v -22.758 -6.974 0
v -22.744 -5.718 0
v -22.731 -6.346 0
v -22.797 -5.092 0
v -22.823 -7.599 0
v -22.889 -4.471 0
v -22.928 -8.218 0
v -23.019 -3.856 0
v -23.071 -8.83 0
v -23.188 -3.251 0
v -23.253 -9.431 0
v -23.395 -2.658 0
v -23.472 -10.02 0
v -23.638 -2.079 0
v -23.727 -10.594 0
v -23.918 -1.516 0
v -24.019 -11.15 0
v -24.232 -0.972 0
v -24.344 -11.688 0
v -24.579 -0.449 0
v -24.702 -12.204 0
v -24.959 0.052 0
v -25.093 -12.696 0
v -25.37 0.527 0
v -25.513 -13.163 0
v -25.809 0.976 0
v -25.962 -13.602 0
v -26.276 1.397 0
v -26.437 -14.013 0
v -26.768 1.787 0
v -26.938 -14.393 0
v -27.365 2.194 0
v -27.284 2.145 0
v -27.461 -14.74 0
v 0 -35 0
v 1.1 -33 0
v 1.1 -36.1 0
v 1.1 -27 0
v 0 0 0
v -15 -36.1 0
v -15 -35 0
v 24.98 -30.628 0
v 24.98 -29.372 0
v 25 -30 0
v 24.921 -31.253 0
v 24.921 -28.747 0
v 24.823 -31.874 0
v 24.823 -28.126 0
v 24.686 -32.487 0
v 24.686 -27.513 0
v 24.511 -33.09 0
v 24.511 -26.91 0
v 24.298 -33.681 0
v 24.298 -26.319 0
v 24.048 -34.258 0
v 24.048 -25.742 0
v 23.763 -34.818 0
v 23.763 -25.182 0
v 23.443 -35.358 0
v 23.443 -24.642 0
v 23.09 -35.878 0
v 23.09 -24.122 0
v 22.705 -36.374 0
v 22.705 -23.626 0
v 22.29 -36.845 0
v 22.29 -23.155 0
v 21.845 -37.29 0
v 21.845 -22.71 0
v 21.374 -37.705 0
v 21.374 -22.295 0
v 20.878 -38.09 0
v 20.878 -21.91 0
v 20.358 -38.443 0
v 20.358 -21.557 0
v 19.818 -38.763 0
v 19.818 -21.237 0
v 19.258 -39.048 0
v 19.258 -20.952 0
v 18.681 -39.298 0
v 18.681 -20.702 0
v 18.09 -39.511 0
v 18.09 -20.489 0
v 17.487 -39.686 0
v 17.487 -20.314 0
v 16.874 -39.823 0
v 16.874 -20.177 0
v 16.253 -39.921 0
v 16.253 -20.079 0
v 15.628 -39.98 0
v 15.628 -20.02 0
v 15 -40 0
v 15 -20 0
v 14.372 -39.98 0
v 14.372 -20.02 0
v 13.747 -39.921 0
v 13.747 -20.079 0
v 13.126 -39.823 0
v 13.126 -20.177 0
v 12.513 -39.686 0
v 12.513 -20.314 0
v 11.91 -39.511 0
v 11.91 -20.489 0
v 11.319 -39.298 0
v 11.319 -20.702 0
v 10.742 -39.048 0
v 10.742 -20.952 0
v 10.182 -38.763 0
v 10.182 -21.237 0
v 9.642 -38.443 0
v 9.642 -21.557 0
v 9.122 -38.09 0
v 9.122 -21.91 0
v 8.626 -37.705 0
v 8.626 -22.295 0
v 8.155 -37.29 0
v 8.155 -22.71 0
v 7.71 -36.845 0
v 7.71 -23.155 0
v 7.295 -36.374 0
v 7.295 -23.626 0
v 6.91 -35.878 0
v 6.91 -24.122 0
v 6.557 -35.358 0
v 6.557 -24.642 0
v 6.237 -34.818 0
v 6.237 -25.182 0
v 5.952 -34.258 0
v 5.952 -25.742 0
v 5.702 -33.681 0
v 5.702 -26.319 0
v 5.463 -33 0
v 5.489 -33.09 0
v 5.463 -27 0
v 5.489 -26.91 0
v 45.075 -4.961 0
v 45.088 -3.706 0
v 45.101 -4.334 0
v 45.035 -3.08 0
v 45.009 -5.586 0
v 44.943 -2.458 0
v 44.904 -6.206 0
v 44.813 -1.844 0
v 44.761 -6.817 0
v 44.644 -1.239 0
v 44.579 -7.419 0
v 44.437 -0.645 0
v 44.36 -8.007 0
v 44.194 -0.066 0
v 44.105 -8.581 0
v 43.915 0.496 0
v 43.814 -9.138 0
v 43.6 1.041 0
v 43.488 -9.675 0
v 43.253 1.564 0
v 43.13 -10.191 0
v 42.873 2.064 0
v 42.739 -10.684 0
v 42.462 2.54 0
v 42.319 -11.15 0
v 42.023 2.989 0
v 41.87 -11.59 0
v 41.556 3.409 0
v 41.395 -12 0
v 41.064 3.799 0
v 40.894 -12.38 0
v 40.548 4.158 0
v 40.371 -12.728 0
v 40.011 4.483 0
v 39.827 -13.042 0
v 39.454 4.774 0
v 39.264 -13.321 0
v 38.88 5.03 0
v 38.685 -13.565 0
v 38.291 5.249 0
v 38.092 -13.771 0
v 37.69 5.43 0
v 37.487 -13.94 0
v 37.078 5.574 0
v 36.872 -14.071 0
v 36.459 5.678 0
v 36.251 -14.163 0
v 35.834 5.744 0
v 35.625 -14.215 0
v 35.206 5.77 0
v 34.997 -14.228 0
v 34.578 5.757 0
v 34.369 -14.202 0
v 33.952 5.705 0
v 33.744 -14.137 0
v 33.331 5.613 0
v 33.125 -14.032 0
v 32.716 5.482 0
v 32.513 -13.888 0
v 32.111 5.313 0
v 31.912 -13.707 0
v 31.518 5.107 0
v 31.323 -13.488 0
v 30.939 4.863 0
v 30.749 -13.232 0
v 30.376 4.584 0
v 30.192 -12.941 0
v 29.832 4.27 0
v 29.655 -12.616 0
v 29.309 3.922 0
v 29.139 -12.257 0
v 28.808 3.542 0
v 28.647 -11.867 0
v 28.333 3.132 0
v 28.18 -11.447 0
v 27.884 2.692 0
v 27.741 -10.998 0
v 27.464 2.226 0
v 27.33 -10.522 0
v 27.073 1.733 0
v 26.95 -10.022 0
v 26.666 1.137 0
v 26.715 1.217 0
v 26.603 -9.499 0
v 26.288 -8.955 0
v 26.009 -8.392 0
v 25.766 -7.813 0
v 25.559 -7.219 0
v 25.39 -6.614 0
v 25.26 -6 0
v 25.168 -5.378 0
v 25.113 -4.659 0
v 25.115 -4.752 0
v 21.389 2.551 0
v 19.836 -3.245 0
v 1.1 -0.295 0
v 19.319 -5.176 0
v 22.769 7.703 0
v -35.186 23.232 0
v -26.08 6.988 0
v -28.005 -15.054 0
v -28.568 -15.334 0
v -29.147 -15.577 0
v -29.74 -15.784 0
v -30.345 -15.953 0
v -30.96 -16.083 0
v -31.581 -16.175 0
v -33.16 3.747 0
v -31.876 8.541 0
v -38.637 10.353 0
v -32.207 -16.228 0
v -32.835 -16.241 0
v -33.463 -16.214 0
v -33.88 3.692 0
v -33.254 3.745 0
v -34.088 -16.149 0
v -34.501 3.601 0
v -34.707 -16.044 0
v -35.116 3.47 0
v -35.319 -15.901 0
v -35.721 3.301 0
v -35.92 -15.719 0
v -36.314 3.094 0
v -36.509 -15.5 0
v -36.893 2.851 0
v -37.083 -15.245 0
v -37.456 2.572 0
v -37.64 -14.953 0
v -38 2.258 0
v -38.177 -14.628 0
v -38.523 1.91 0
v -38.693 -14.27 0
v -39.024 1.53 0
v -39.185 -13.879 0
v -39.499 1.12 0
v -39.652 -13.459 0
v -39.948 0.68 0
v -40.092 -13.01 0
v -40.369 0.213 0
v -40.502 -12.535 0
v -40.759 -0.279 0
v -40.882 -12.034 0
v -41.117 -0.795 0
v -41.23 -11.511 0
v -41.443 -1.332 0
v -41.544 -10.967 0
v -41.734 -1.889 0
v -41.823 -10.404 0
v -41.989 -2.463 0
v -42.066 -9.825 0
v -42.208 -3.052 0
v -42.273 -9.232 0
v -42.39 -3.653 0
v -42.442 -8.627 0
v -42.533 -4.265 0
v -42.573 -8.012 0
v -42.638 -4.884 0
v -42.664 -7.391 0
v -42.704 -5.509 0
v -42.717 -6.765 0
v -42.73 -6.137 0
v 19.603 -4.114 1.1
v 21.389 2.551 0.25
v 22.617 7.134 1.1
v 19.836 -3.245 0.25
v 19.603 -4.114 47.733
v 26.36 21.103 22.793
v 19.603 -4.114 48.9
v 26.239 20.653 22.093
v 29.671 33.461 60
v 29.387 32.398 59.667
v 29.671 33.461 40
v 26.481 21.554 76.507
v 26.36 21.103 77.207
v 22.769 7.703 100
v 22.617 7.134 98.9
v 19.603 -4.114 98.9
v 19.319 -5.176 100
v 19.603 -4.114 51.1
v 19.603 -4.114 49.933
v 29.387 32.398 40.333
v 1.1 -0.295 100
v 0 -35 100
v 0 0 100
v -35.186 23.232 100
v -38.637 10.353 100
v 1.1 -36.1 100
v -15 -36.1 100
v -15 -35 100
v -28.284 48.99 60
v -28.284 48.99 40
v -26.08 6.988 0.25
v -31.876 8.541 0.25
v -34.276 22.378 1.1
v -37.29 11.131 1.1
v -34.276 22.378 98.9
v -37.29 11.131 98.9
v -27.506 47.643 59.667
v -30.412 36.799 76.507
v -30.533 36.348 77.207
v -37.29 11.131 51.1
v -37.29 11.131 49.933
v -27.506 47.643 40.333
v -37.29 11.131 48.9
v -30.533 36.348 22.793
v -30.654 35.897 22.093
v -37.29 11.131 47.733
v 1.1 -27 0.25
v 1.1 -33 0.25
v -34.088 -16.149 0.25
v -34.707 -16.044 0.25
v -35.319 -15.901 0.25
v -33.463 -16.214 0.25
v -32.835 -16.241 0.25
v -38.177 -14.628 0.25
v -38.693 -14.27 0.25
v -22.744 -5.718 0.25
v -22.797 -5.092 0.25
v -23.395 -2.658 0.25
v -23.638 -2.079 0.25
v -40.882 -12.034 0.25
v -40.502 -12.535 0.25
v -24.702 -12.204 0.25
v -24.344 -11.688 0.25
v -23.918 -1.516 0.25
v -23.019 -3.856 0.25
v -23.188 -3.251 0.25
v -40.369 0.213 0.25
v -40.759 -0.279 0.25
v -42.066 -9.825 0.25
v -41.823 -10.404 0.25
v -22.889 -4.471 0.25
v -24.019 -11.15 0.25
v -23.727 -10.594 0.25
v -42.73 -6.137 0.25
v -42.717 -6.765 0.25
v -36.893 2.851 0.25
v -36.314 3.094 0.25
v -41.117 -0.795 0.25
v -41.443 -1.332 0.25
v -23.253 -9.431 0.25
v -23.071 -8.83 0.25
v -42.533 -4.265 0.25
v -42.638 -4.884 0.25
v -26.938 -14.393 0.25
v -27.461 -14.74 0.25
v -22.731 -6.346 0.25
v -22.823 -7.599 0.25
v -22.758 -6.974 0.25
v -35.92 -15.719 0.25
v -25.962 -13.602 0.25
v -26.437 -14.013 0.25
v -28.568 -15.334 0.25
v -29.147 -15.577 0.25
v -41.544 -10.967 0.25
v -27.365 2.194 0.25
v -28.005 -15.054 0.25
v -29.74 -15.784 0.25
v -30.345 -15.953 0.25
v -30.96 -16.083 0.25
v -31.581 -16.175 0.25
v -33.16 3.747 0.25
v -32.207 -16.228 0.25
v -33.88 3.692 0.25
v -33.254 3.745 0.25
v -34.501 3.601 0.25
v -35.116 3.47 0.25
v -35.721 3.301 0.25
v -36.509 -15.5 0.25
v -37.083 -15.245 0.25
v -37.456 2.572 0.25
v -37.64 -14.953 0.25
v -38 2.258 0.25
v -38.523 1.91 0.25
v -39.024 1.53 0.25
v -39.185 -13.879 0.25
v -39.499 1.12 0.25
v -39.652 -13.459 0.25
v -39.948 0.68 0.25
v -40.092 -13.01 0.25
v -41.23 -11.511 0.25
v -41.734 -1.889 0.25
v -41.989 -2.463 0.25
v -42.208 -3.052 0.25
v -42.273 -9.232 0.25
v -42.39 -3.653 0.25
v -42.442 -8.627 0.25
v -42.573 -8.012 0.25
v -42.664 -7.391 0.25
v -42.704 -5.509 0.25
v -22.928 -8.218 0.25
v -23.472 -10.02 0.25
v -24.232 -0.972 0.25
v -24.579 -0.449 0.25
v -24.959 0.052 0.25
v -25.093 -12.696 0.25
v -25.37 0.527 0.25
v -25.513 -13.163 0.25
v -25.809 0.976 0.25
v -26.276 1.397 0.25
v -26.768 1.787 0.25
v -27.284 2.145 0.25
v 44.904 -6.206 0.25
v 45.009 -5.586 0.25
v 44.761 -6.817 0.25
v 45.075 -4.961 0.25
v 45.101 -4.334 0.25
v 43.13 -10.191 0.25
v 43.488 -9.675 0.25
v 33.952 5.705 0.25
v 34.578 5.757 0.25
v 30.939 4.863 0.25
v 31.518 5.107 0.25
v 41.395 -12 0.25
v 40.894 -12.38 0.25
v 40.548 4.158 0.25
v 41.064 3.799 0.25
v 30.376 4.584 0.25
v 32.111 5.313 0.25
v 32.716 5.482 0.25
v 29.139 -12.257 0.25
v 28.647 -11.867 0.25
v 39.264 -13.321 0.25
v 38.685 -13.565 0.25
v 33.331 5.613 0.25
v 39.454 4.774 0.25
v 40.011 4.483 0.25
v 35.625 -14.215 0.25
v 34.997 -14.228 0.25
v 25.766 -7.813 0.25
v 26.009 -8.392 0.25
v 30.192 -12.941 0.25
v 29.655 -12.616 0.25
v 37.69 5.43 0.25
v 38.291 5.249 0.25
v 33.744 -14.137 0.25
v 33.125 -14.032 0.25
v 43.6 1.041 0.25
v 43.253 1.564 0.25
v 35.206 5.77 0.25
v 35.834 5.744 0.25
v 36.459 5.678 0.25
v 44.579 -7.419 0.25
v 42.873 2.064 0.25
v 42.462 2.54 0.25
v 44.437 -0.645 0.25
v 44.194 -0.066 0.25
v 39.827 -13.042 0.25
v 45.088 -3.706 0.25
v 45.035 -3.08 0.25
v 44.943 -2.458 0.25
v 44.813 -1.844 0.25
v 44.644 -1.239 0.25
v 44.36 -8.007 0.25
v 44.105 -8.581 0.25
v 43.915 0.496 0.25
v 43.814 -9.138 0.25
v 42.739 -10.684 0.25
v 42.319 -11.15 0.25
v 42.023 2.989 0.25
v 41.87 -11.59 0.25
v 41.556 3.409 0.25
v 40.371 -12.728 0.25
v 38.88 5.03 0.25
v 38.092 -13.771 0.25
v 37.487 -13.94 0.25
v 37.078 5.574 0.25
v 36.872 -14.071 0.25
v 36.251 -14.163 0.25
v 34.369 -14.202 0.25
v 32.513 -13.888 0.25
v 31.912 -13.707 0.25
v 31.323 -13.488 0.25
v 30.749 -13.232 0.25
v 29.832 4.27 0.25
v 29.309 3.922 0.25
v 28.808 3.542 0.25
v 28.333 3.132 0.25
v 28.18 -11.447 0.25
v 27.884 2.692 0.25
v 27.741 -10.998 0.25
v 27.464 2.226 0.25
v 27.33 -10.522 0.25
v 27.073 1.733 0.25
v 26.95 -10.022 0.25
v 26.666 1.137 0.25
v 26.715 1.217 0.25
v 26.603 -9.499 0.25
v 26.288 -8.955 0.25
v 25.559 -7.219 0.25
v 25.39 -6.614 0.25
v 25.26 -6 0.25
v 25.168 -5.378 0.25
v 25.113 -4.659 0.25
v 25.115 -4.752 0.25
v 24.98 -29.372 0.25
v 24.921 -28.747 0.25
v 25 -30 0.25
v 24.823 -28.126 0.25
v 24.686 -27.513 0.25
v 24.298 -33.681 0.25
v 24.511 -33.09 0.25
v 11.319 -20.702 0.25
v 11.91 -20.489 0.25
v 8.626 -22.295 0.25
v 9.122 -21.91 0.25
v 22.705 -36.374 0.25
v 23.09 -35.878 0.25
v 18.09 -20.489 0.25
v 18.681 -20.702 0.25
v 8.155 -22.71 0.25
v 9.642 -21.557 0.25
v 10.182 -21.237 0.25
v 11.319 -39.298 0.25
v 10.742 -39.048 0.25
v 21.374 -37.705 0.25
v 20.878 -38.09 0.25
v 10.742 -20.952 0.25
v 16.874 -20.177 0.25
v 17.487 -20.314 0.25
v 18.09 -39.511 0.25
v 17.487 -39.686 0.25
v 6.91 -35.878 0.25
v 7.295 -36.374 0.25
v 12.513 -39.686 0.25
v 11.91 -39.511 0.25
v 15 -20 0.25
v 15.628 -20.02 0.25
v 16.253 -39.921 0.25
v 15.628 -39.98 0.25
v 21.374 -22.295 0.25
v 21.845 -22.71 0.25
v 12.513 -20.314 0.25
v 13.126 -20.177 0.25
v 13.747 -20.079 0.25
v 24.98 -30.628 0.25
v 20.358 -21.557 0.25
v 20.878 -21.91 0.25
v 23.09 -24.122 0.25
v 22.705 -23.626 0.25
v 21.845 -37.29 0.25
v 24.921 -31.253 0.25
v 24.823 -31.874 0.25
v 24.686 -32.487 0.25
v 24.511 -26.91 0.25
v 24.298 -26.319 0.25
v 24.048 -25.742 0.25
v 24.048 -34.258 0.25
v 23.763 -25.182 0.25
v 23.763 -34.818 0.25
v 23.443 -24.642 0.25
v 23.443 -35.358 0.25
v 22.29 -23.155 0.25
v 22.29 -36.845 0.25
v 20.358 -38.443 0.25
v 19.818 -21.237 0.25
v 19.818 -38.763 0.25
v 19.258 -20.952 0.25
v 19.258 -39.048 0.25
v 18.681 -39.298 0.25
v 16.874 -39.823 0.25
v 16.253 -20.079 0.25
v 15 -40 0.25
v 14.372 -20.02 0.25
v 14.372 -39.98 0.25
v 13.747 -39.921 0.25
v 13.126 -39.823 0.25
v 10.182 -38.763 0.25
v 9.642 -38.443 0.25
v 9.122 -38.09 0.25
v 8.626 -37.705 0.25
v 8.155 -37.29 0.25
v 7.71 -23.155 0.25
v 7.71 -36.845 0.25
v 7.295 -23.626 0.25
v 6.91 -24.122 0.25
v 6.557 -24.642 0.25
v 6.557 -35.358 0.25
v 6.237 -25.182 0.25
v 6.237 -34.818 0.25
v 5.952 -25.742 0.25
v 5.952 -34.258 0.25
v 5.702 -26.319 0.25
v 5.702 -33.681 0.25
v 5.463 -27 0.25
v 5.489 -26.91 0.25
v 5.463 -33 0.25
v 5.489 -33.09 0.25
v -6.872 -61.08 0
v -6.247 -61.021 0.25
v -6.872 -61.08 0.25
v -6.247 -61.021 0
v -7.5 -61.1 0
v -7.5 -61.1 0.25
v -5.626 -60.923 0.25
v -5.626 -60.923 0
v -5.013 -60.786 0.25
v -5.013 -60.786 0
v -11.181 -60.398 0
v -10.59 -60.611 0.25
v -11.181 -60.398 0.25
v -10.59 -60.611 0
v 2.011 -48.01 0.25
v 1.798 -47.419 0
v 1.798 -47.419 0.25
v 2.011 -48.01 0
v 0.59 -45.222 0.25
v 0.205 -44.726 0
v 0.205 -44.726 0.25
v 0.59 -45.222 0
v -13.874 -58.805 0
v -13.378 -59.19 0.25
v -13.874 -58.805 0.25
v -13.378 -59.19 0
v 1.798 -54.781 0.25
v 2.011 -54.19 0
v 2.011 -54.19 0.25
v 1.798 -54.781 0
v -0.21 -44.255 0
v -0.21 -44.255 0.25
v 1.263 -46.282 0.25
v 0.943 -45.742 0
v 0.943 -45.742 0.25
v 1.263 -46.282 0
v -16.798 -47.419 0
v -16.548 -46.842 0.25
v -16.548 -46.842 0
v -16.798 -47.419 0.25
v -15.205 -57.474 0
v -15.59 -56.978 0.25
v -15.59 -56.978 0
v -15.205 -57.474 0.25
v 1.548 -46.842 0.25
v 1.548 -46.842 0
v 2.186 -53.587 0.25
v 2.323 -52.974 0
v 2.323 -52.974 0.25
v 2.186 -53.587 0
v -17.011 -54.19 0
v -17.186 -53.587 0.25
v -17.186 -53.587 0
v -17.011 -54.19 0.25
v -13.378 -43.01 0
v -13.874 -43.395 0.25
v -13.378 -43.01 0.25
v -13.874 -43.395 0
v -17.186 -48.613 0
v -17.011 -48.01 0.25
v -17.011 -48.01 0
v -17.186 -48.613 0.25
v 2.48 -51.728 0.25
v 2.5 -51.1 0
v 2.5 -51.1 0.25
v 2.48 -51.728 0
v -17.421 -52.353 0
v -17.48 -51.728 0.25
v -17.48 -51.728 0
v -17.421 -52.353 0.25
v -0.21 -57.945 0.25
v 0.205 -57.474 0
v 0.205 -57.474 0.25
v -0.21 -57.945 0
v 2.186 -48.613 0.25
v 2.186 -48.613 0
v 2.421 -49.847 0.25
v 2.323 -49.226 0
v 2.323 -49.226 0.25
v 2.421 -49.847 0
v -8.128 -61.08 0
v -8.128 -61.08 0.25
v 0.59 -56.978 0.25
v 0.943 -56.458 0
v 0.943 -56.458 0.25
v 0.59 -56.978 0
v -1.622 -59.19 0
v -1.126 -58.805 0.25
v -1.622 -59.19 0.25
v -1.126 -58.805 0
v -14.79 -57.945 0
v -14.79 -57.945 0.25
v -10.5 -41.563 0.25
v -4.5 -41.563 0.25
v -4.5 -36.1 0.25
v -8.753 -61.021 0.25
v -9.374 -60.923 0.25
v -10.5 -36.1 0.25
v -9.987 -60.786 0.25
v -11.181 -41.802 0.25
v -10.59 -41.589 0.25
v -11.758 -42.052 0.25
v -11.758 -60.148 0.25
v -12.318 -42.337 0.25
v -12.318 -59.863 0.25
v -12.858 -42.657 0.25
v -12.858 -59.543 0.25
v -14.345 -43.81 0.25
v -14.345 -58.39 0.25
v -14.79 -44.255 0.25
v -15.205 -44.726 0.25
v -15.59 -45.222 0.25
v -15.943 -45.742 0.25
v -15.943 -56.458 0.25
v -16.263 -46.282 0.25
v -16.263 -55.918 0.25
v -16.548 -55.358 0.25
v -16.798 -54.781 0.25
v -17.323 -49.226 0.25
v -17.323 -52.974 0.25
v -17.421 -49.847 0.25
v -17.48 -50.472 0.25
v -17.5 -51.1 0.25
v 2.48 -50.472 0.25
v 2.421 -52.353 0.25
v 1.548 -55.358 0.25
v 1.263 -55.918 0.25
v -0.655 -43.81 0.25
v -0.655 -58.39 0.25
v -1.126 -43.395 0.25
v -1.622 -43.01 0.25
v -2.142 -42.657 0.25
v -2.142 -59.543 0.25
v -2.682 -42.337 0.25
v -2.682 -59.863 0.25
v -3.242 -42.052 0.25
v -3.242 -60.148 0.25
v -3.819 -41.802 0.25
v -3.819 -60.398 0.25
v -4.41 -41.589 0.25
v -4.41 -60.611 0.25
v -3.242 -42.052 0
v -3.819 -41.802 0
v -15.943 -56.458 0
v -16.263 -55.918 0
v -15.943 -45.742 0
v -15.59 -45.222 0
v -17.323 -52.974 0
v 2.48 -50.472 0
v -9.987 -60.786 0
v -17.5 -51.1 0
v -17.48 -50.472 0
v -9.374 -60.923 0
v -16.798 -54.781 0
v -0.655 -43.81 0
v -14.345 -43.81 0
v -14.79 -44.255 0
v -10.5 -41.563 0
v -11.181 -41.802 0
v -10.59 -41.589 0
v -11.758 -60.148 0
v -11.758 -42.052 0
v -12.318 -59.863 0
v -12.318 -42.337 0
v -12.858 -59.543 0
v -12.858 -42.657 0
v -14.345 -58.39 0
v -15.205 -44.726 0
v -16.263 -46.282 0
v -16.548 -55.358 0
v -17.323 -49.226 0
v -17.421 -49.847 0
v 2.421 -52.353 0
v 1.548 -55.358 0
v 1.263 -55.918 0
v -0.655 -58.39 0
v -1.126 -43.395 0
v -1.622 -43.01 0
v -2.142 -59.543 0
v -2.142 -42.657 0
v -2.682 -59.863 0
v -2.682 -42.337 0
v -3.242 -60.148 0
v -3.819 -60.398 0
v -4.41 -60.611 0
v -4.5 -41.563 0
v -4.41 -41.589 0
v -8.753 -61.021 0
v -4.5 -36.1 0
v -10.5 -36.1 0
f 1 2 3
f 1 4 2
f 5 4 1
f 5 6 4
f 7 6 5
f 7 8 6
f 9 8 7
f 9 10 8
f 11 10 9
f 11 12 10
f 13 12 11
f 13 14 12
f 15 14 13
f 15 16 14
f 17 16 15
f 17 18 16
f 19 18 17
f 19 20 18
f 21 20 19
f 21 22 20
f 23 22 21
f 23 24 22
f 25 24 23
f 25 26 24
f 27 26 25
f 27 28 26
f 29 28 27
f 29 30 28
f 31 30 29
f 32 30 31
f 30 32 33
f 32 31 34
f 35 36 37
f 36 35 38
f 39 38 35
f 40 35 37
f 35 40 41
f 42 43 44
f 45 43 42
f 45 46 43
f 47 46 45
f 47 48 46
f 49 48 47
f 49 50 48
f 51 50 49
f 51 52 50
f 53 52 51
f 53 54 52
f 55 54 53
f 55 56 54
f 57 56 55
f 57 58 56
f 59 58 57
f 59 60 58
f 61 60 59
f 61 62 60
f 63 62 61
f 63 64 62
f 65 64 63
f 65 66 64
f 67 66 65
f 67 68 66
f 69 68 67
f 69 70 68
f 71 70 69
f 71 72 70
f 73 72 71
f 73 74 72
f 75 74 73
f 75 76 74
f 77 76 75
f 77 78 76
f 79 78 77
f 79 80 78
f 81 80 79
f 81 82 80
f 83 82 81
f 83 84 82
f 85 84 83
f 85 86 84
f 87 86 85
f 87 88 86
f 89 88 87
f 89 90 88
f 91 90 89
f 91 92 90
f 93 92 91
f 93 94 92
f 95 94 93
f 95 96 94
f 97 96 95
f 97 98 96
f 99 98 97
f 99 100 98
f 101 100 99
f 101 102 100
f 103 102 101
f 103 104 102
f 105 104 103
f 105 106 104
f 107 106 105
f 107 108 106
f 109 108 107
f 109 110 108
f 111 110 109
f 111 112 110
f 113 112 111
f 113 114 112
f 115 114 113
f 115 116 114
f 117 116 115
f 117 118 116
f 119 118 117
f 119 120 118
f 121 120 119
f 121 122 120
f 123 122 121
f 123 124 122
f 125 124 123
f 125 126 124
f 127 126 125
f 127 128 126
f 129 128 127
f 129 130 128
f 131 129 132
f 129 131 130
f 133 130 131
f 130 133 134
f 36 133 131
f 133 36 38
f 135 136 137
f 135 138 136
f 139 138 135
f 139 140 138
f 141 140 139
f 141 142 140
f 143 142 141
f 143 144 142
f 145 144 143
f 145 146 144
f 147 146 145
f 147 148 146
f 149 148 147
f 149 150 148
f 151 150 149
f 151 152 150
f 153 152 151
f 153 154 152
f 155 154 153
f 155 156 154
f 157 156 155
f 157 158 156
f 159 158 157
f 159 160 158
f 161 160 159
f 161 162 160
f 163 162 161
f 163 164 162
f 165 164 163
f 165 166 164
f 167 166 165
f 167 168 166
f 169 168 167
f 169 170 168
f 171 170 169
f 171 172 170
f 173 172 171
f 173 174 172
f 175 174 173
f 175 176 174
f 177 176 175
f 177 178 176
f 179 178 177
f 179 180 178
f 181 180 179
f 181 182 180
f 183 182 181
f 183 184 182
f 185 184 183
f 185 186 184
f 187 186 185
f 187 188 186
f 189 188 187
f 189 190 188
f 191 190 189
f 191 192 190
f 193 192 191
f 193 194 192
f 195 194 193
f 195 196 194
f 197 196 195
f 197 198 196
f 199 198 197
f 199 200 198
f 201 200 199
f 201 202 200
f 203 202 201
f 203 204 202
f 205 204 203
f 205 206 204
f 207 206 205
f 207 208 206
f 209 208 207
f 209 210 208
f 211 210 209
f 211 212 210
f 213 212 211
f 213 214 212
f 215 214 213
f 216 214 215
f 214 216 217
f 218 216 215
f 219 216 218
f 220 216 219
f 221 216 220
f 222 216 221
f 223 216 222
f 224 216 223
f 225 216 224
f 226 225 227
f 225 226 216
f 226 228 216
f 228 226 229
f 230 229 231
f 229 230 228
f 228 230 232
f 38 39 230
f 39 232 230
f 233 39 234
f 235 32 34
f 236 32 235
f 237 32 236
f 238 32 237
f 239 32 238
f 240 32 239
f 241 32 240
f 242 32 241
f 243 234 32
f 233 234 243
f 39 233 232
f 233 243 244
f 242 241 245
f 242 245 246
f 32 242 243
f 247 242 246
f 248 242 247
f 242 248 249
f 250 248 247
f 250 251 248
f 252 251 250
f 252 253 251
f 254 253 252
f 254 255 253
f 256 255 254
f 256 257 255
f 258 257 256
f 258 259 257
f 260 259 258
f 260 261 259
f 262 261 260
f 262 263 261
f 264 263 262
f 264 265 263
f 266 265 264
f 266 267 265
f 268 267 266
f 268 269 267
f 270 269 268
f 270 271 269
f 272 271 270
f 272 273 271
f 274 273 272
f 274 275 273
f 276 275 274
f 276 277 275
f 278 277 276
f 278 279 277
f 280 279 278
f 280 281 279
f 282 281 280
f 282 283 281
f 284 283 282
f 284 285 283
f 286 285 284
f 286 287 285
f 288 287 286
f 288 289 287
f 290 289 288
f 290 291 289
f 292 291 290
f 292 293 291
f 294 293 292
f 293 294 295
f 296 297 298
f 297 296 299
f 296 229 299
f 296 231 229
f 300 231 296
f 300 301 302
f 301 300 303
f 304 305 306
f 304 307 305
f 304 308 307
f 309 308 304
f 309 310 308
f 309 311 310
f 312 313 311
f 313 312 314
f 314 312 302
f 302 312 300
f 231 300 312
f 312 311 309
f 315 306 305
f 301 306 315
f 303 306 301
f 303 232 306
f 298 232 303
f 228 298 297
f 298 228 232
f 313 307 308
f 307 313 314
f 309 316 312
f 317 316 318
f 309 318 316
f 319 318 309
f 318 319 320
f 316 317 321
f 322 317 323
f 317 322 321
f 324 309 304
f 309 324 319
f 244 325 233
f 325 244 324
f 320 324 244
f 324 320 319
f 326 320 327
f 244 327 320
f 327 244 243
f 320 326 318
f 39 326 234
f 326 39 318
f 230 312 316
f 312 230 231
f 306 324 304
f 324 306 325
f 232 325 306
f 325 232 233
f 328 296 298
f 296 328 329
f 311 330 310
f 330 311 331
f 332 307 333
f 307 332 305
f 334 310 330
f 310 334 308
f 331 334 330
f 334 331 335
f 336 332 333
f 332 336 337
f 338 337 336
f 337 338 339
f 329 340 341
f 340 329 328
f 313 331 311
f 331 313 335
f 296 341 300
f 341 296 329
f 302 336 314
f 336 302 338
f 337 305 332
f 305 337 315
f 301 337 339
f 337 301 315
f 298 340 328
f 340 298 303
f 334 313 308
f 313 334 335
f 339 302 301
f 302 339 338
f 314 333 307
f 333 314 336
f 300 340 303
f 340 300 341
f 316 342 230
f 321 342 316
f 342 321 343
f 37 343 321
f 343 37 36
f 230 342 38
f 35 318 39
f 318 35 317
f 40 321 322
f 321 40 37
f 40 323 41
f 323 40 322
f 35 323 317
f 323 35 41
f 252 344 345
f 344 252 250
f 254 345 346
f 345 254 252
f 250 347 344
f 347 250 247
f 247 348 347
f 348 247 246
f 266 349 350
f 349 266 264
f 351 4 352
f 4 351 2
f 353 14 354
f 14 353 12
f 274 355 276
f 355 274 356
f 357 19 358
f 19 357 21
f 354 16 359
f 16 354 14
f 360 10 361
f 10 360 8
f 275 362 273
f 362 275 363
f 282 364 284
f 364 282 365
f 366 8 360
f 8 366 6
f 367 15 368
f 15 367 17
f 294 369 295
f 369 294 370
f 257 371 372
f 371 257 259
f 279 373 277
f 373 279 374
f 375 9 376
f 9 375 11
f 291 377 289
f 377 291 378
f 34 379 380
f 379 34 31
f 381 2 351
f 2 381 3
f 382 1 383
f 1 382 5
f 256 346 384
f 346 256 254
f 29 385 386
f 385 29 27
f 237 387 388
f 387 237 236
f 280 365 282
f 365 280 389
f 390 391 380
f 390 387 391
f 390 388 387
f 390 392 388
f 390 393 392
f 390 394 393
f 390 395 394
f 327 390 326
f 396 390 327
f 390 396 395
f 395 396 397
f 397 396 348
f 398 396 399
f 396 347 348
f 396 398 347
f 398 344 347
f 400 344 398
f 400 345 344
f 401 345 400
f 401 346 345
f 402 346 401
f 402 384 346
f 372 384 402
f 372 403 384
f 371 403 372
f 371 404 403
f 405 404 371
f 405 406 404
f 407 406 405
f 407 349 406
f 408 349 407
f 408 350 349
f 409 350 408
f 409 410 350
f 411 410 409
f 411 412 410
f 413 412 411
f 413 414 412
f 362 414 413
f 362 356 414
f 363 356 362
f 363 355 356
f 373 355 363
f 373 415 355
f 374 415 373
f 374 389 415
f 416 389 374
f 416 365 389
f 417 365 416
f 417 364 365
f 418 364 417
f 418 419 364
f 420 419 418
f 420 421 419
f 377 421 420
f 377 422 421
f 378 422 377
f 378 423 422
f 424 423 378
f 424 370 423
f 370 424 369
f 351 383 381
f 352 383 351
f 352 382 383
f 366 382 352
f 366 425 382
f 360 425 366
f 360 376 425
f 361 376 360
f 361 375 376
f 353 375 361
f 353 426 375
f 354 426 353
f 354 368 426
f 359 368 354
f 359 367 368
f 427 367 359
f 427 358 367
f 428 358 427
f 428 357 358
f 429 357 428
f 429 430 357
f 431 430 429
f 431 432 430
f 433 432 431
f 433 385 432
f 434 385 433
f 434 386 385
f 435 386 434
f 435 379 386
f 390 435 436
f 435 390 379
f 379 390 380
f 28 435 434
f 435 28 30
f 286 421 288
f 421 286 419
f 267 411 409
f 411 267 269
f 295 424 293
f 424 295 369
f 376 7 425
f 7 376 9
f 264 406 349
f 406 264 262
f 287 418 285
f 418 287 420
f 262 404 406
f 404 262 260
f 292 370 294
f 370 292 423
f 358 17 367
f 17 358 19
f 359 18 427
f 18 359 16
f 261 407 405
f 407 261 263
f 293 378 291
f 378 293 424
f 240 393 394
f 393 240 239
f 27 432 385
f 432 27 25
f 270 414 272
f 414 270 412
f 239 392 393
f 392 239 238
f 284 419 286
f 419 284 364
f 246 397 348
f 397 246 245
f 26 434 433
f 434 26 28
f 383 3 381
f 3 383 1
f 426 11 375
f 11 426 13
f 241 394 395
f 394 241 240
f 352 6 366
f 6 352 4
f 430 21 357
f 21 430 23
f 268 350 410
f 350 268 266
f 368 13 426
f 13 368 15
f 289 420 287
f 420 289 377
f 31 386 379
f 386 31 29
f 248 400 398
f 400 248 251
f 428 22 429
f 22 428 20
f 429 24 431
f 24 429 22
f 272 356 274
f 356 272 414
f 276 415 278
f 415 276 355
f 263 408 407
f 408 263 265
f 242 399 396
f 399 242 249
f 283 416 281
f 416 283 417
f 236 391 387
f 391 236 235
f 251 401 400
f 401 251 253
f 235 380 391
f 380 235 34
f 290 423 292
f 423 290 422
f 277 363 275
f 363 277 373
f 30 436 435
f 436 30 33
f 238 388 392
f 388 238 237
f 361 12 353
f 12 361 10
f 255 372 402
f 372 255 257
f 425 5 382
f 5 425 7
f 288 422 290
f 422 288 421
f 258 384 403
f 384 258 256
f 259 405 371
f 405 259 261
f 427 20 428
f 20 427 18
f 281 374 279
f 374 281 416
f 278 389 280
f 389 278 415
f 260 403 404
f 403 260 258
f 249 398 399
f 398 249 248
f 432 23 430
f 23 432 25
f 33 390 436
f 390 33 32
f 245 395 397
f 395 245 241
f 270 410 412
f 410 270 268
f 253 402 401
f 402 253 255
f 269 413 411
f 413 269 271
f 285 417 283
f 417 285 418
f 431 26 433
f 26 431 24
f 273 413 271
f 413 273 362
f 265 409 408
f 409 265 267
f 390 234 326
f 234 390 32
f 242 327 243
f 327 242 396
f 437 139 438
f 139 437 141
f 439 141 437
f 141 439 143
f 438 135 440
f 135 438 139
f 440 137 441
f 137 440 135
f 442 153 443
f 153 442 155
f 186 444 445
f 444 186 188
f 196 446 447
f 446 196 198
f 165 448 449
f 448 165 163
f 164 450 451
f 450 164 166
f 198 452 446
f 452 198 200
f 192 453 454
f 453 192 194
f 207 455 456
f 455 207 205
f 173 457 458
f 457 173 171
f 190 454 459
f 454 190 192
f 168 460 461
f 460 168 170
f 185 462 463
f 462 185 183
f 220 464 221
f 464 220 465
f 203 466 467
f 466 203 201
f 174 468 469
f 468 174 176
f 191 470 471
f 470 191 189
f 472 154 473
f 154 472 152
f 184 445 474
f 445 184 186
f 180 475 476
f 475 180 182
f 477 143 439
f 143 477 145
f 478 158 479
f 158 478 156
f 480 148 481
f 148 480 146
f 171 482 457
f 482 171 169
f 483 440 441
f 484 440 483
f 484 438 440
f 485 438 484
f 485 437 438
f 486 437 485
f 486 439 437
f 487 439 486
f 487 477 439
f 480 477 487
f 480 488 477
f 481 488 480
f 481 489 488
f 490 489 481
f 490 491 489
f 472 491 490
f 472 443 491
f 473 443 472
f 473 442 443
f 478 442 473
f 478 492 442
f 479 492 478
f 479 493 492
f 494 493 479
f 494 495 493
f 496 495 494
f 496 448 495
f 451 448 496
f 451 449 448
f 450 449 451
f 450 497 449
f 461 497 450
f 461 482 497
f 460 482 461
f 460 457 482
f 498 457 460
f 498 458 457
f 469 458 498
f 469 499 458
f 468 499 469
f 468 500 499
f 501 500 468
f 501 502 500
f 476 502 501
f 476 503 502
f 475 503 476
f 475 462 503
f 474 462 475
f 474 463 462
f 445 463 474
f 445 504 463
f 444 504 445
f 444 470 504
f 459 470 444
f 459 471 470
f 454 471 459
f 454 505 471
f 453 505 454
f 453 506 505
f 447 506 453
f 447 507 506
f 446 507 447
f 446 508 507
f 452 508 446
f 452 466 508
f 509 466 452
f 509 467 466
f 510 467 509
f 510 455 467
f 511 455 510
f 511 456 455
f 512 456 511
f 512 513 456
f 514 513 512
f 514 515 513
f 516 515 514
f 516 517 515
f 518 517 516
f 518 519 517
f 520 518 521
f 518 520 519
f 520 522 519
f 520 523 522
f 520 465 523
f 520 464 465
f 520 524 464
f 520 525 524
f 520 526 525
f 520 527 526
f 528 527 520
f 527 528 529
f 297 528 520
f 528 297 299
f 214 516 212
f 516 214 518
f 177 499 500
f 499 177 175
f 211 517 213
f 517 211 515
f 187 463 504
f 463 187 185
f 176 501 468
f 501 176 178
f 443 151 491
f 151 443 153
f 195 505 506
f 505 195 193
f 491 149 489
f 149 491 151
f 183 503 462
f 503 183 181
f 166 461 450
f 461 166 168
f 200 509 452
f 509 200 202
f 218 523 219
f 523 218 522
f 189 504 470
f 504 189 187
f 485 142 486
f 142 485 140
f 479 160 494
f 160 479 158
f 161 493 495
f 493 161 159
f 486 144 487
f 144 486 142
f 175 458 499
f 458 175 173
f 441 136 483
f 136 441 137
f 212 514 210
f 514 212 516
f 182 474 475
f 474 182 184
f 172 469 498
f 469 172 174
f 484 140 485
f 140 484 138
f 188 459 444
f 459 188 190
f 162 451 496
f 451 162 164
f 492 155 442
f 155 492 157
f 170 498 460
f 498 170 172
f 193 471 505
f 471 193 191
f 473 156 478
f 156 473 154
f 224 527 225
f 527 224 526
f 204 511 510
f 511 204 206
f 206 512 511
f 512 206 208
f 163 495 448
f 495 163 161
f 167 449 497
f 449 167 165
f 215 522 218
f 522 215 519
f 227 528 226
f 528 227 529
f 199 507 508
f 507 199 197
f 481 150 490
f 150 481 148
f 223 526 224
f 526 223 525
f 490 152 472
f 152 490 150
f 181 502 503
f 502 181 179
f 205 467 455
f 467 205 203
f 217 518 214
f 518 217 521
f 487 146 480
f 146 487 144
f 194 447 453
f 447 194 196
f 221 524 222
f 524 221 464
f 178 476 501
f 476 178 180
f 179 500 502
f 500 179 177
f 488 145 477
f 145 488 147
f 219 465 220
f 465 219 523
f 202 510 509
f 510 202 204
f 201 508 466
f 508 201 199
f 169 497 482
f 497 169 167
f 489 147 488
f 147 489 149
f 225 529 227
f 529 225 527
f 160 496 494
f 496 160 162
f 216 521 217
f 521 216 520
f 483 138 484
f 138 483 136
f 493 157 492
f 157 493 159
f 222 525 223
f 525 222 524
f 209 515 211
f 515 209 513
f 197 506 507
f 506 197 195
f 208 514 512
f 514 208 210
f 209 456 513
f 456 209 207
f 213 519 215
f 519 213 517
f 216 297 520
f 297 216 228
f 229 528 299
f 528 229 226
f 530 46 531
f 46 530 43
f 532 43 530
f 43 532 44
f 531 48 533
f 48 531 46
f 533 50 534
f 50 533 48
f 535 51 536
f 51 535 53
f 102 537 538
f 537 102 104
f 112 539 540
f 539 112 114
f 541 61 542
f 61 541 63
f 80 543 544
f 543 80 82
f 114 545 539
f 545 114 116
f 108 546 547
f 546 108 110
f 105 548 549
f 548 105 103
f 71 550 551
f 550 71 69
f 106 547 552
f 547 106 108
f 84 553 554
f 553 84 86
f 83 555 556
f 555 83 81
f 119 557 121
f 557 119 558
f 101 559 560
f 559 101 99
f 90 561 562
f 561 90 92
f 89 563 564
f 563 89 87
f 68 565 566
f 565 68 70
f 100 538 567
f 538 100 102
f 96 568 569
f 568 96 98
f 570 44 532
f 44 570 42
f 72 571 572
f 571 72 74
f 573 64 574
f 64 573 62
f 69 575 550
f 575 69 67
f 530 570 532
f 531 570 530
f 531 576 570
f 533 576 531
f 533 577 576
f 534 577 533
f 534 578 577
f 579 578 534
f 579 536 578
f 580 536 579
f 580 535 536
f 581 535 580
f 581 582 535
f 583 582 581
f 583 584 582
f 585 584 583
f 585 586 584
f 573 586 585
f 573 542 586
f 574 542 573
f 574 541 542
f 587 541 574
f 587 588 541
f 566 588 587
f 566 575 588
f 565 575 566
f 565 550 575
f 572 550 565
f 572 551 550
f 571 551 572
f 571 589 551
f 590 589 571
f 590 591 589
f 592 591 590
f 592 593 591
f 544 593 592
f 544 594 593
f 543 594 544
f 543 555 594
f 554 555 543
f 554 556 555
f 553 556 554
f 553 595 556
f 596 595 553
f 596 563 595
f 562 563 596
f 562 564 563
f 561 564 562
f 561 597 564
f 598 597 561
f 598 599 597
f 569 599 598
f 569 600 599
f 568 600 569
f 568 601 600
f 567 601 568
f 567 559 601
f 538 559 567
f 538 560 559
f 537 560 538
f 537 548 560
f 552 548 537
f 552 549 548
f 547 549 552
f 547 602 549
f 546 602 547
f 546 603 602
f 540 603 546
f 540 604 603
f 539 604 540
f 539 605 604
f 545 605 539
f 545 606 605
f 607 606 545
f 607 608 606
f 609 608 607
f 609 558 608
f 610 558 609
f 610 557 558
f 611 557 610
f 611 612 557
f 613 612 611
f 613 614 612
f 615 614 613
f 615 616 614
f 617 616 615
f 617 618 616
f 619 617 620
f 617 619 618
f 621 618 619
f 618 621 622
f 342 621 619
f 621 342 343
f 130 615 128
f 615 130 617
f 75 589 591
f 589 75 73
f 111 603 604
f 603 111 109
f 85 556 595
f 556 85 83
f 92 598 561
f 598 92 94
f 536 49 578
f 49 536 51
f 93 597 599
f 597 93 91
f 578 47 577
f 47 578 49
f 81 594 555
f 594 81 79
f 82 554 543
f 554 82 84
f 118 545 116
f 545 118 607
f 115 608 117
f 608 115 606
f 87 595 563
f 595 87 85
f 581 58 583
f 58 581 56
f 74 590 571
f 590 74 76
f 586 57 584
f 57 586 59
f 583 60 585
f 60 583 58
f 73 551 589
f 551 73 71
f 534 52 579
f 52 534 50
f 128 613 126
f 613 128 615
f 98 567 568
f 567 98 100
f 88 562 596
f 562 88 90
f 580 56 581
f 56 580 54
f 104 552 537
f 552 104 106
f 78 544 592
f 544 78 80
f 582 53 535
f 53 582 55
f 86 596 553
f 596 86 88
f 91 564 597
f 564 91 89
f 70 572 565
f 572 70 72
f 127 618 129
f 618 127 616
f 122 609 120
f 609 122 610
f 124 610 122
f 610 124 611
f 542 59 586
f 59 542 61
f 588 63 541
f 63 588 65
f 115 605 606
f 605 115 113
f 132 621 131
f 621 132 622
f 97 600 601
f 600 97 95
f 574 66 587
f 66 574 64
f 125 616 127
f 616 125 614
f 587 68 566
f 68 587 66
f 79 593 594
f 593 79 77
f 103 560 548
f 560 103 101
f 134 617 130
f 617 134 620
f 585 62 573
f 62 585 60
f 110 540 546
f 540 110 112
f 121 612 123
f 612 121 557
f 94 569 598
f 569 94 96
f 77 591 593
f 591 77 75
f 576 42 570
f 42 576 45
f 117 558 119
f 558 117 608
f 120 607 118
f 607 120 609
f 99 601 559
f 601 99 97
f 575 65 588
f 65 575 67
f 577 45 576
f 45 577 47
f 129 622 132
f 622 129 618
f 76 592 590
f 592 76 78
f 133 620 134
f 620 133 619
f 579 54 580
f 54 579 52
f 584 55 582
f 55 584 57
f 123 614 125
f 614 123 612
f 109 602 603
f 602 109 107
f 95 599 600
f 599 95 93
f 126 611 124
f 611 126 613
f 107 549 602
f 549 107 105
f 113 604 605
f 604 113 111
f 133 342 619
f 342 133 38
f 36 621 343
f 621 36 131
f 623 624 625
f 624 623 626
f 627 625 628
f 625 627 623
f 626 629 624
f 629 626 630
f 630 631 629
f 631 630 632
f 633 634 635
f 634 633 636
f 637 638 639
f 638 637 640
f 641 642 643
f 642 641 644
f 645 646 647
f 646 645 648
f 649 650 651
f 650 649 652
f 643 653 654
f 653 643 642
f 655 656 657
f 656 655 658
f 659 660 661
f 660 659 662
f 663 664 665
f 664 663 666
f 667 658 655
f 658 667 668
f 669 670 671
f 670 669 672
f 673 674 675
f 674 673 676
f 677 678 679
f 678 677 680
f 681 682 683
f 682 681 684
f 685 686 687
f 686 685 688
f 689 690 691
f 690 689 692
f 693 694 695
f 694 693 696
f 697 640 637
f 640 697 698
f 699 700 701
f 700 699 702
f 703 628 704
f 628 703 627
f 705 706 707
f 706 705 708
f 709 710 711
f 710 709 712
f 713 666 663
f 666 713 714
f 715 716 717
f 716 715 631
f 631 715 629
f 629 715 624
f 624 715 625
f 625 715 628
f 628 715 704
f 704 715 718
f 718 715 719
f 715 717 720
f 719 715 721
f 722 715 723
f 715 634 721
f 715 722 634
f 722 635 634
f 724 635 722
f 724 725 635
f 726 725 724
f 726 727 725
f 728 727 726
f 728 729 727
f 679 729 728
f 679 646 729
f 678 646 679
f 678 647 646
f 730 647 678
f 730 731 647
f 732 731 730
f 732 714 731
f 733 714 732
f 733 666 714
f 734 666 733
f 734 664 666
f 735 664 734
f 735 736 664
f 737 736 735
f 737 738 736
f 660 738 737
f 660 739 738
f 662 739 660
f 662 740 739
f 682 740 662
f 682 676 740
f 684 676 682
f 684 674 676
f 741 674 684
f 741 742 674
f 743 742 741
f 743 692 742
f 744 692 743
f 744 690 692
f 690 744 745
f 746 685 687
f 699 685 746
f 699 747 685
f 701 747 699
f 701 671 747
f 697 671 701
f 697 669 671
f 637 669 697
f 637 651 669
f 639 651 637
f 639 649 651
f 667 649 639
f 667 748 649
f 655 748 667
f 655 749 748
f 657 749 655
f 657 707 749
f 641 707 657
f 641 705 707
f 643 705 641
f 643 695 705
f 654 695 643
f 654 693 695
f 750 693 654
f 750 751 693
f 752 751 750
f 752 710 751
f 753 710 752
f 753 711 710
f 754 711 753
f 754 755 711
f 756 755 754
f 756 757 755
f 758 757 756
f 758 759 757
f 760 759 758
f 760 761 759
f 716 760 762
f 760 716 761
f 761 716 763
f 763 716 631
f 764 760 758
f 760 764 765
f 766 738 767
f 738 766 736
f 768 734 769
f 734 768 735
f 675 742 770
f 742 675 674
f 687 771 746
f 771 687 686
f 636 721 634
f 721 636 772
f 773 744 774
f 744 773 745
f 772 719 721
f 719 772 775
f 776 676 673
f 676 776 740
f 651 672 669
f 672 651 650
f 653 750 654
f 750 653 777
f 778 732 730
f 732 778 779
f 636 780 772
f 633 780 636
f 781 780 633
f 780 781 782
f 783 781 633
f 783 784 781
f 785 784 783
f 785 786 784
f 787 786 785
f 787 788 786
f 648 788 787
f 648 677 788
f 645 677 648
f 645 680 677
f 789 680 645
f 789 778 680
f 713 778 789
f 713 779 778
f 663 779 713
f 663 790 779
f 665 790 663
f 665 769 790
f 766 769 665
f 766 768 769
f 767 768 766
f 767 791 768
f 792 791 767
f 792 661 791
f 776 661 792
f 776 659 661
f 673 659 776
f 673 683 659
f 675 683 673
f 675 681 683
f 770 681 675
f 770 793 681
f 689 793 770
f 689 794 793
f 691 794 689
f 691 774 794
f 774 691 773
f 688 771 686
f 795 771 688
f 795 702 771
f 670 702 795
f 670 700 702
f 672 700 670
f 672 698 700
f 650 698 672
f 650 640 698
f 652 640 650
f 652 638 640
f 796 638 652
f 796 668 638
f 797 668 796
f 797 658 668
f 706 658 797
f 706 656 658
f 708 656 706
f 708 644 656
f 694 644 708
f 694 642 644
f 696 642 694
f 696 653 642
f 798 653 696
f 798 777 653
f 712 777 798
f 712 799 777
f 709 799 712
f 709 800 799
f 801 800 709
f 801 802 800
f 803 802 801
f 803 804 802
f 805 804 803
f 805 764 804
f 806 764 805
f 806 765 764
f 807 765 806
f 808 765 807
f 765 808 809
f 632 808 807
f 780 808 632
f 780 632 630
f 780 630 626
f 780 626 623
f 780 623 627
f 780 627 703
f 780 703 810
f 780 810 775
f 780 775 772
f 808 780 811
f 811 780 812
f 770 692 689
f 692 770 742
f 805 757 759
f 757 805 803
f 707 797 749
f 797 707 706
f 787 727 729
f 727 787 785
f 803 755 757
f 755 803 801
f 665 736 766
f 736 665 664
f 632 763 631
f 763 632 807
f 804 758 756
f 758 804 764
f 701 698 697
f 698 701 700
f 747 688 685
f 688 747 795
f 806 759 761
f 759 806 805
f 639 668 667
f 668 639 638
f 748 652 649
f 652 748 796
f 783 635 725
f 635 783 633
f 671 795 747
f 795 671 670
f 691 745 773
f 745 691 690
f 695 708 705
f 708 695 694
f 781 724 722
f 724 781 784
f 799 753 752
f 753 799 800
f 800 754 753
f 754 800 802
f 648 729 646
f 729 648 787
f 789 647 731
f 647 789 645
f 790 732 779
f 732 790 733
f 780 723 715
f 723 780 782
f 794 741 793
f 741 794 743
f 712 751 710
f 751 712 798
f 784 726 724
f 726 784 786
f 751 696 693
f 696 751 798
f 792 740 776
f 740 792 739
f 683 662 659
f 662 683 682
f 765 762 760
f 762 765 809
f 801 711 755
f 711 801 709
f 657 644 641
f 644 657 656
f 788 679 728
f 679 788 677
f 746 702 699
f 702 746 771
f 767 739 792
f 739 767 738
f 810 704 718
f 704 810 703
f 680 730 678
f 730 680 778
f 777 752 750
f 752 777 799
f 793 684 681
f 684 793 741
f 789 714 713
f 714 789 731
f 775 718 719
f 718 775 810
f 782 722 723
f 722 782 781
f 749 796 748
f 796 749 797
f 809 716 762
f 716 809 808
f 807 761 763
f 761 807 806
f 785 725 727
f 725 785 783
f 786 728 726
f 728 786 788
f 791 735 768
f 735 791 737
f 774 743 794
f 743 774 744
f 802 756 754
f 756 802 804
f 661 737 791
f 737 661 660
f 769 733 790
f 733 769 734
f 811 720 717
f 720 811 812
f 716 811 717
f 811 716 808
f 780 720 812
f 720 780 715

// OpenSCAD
// -----------------------------------------------------
// Stift-Ablage @ Display-Oberkante
//
//  Detlev Ahlgrimm, 04.05.2019
// -----------------------------------------------------

// depth arm
tiefe_arm=35;

// height arm
hoehe_arm=15;

// depth holder
tiefe_halter=40;

// width total
breite_gesamt=100;

// height total
hoehe_gesamt=60;

// z-pos arm
zpos_arm=40;

// angle
winkel=15;

// wallthickness
ws=1.1;

// include separators
unterteilung=1;     // [0:False, 1:True]

// include brim
brim=1;             // [0:False, 1:True]

/* [Hidden] */
$fn=100;
xp=breite_gesamt/2-tiefe_halter;

module Halter2D() {
  polygon([ [-breite_gesamt/2,0], [-breite_gesamt/2,tiefe_halter/3], [-xp,tiefe_halter], [xp,tiefe_halter], [breite_gesamt/2,tiefe_halter/3], [breite_gesamt/2,0] ]);
}

module Brim(a=0) {
  rotate([0, 0, a]) {
    translate([15, 0, 0]) cylinder(d=20, h=0.25);
    translate([0, -3, 0]) cube([10, 6, 0.25]);
  }
}

module Halter() {
  rotate([winkel, 0, 0]) translate([0, 0, -zpos_arm]) {
    difference() {
      linear_extrude(hoehe_gesamt) Halter2D();
      translate([0, 0, ws]) linear_extrude(hoehe_gesamt) offset(-ws) Halter2D();
    }
    if(unterteilung) intersection() {
      linear_extrude(hoehe_gesamt) Halter2D();
      rotate([0, 0, 45]) cube([ws*0.75, 2*tiefe_halter, hoehe_gesamt]);
    }
    if(unterteilung) intersection() {
      linear_extrude(hoehe_gesamt) Halter2D();
      rotate([0, 0, -45]) cube([ws*0.75, 2*tiefe_halter, hoehe_gesamt]);
    }
  }
  translate([-breite_gesamt/2, -tiefe_arm-ws, 0]) cube([breite_gesamt, tiefe_arm+ws, ws]);
  translate([-breite_gesamt/2, -tiefe_arm-ws, -hoehe_arm]) cube([breite_gesamt, ws, hoehe_arm+ws]);
}
translate([0, 0, breite_gesamt/2]) rotate([0, 90, 0]) 
Halter();

if(brim) {
  rotate([0, 0, -winkel]) translate([-zpos_arm+10, 0.5, 0]) Brim(-90);
  rotate([0, 0, -winkel]) translate([hoehe_gesamt-zpos_arm, xp/2, 0]) Brim(0);
  translate([0, -tiefe_arm+5, 0]) Brim(0);
  translate([-hoehe_arm/2, -tiefe_arm-ws, 0]) Brim(-90);
}
